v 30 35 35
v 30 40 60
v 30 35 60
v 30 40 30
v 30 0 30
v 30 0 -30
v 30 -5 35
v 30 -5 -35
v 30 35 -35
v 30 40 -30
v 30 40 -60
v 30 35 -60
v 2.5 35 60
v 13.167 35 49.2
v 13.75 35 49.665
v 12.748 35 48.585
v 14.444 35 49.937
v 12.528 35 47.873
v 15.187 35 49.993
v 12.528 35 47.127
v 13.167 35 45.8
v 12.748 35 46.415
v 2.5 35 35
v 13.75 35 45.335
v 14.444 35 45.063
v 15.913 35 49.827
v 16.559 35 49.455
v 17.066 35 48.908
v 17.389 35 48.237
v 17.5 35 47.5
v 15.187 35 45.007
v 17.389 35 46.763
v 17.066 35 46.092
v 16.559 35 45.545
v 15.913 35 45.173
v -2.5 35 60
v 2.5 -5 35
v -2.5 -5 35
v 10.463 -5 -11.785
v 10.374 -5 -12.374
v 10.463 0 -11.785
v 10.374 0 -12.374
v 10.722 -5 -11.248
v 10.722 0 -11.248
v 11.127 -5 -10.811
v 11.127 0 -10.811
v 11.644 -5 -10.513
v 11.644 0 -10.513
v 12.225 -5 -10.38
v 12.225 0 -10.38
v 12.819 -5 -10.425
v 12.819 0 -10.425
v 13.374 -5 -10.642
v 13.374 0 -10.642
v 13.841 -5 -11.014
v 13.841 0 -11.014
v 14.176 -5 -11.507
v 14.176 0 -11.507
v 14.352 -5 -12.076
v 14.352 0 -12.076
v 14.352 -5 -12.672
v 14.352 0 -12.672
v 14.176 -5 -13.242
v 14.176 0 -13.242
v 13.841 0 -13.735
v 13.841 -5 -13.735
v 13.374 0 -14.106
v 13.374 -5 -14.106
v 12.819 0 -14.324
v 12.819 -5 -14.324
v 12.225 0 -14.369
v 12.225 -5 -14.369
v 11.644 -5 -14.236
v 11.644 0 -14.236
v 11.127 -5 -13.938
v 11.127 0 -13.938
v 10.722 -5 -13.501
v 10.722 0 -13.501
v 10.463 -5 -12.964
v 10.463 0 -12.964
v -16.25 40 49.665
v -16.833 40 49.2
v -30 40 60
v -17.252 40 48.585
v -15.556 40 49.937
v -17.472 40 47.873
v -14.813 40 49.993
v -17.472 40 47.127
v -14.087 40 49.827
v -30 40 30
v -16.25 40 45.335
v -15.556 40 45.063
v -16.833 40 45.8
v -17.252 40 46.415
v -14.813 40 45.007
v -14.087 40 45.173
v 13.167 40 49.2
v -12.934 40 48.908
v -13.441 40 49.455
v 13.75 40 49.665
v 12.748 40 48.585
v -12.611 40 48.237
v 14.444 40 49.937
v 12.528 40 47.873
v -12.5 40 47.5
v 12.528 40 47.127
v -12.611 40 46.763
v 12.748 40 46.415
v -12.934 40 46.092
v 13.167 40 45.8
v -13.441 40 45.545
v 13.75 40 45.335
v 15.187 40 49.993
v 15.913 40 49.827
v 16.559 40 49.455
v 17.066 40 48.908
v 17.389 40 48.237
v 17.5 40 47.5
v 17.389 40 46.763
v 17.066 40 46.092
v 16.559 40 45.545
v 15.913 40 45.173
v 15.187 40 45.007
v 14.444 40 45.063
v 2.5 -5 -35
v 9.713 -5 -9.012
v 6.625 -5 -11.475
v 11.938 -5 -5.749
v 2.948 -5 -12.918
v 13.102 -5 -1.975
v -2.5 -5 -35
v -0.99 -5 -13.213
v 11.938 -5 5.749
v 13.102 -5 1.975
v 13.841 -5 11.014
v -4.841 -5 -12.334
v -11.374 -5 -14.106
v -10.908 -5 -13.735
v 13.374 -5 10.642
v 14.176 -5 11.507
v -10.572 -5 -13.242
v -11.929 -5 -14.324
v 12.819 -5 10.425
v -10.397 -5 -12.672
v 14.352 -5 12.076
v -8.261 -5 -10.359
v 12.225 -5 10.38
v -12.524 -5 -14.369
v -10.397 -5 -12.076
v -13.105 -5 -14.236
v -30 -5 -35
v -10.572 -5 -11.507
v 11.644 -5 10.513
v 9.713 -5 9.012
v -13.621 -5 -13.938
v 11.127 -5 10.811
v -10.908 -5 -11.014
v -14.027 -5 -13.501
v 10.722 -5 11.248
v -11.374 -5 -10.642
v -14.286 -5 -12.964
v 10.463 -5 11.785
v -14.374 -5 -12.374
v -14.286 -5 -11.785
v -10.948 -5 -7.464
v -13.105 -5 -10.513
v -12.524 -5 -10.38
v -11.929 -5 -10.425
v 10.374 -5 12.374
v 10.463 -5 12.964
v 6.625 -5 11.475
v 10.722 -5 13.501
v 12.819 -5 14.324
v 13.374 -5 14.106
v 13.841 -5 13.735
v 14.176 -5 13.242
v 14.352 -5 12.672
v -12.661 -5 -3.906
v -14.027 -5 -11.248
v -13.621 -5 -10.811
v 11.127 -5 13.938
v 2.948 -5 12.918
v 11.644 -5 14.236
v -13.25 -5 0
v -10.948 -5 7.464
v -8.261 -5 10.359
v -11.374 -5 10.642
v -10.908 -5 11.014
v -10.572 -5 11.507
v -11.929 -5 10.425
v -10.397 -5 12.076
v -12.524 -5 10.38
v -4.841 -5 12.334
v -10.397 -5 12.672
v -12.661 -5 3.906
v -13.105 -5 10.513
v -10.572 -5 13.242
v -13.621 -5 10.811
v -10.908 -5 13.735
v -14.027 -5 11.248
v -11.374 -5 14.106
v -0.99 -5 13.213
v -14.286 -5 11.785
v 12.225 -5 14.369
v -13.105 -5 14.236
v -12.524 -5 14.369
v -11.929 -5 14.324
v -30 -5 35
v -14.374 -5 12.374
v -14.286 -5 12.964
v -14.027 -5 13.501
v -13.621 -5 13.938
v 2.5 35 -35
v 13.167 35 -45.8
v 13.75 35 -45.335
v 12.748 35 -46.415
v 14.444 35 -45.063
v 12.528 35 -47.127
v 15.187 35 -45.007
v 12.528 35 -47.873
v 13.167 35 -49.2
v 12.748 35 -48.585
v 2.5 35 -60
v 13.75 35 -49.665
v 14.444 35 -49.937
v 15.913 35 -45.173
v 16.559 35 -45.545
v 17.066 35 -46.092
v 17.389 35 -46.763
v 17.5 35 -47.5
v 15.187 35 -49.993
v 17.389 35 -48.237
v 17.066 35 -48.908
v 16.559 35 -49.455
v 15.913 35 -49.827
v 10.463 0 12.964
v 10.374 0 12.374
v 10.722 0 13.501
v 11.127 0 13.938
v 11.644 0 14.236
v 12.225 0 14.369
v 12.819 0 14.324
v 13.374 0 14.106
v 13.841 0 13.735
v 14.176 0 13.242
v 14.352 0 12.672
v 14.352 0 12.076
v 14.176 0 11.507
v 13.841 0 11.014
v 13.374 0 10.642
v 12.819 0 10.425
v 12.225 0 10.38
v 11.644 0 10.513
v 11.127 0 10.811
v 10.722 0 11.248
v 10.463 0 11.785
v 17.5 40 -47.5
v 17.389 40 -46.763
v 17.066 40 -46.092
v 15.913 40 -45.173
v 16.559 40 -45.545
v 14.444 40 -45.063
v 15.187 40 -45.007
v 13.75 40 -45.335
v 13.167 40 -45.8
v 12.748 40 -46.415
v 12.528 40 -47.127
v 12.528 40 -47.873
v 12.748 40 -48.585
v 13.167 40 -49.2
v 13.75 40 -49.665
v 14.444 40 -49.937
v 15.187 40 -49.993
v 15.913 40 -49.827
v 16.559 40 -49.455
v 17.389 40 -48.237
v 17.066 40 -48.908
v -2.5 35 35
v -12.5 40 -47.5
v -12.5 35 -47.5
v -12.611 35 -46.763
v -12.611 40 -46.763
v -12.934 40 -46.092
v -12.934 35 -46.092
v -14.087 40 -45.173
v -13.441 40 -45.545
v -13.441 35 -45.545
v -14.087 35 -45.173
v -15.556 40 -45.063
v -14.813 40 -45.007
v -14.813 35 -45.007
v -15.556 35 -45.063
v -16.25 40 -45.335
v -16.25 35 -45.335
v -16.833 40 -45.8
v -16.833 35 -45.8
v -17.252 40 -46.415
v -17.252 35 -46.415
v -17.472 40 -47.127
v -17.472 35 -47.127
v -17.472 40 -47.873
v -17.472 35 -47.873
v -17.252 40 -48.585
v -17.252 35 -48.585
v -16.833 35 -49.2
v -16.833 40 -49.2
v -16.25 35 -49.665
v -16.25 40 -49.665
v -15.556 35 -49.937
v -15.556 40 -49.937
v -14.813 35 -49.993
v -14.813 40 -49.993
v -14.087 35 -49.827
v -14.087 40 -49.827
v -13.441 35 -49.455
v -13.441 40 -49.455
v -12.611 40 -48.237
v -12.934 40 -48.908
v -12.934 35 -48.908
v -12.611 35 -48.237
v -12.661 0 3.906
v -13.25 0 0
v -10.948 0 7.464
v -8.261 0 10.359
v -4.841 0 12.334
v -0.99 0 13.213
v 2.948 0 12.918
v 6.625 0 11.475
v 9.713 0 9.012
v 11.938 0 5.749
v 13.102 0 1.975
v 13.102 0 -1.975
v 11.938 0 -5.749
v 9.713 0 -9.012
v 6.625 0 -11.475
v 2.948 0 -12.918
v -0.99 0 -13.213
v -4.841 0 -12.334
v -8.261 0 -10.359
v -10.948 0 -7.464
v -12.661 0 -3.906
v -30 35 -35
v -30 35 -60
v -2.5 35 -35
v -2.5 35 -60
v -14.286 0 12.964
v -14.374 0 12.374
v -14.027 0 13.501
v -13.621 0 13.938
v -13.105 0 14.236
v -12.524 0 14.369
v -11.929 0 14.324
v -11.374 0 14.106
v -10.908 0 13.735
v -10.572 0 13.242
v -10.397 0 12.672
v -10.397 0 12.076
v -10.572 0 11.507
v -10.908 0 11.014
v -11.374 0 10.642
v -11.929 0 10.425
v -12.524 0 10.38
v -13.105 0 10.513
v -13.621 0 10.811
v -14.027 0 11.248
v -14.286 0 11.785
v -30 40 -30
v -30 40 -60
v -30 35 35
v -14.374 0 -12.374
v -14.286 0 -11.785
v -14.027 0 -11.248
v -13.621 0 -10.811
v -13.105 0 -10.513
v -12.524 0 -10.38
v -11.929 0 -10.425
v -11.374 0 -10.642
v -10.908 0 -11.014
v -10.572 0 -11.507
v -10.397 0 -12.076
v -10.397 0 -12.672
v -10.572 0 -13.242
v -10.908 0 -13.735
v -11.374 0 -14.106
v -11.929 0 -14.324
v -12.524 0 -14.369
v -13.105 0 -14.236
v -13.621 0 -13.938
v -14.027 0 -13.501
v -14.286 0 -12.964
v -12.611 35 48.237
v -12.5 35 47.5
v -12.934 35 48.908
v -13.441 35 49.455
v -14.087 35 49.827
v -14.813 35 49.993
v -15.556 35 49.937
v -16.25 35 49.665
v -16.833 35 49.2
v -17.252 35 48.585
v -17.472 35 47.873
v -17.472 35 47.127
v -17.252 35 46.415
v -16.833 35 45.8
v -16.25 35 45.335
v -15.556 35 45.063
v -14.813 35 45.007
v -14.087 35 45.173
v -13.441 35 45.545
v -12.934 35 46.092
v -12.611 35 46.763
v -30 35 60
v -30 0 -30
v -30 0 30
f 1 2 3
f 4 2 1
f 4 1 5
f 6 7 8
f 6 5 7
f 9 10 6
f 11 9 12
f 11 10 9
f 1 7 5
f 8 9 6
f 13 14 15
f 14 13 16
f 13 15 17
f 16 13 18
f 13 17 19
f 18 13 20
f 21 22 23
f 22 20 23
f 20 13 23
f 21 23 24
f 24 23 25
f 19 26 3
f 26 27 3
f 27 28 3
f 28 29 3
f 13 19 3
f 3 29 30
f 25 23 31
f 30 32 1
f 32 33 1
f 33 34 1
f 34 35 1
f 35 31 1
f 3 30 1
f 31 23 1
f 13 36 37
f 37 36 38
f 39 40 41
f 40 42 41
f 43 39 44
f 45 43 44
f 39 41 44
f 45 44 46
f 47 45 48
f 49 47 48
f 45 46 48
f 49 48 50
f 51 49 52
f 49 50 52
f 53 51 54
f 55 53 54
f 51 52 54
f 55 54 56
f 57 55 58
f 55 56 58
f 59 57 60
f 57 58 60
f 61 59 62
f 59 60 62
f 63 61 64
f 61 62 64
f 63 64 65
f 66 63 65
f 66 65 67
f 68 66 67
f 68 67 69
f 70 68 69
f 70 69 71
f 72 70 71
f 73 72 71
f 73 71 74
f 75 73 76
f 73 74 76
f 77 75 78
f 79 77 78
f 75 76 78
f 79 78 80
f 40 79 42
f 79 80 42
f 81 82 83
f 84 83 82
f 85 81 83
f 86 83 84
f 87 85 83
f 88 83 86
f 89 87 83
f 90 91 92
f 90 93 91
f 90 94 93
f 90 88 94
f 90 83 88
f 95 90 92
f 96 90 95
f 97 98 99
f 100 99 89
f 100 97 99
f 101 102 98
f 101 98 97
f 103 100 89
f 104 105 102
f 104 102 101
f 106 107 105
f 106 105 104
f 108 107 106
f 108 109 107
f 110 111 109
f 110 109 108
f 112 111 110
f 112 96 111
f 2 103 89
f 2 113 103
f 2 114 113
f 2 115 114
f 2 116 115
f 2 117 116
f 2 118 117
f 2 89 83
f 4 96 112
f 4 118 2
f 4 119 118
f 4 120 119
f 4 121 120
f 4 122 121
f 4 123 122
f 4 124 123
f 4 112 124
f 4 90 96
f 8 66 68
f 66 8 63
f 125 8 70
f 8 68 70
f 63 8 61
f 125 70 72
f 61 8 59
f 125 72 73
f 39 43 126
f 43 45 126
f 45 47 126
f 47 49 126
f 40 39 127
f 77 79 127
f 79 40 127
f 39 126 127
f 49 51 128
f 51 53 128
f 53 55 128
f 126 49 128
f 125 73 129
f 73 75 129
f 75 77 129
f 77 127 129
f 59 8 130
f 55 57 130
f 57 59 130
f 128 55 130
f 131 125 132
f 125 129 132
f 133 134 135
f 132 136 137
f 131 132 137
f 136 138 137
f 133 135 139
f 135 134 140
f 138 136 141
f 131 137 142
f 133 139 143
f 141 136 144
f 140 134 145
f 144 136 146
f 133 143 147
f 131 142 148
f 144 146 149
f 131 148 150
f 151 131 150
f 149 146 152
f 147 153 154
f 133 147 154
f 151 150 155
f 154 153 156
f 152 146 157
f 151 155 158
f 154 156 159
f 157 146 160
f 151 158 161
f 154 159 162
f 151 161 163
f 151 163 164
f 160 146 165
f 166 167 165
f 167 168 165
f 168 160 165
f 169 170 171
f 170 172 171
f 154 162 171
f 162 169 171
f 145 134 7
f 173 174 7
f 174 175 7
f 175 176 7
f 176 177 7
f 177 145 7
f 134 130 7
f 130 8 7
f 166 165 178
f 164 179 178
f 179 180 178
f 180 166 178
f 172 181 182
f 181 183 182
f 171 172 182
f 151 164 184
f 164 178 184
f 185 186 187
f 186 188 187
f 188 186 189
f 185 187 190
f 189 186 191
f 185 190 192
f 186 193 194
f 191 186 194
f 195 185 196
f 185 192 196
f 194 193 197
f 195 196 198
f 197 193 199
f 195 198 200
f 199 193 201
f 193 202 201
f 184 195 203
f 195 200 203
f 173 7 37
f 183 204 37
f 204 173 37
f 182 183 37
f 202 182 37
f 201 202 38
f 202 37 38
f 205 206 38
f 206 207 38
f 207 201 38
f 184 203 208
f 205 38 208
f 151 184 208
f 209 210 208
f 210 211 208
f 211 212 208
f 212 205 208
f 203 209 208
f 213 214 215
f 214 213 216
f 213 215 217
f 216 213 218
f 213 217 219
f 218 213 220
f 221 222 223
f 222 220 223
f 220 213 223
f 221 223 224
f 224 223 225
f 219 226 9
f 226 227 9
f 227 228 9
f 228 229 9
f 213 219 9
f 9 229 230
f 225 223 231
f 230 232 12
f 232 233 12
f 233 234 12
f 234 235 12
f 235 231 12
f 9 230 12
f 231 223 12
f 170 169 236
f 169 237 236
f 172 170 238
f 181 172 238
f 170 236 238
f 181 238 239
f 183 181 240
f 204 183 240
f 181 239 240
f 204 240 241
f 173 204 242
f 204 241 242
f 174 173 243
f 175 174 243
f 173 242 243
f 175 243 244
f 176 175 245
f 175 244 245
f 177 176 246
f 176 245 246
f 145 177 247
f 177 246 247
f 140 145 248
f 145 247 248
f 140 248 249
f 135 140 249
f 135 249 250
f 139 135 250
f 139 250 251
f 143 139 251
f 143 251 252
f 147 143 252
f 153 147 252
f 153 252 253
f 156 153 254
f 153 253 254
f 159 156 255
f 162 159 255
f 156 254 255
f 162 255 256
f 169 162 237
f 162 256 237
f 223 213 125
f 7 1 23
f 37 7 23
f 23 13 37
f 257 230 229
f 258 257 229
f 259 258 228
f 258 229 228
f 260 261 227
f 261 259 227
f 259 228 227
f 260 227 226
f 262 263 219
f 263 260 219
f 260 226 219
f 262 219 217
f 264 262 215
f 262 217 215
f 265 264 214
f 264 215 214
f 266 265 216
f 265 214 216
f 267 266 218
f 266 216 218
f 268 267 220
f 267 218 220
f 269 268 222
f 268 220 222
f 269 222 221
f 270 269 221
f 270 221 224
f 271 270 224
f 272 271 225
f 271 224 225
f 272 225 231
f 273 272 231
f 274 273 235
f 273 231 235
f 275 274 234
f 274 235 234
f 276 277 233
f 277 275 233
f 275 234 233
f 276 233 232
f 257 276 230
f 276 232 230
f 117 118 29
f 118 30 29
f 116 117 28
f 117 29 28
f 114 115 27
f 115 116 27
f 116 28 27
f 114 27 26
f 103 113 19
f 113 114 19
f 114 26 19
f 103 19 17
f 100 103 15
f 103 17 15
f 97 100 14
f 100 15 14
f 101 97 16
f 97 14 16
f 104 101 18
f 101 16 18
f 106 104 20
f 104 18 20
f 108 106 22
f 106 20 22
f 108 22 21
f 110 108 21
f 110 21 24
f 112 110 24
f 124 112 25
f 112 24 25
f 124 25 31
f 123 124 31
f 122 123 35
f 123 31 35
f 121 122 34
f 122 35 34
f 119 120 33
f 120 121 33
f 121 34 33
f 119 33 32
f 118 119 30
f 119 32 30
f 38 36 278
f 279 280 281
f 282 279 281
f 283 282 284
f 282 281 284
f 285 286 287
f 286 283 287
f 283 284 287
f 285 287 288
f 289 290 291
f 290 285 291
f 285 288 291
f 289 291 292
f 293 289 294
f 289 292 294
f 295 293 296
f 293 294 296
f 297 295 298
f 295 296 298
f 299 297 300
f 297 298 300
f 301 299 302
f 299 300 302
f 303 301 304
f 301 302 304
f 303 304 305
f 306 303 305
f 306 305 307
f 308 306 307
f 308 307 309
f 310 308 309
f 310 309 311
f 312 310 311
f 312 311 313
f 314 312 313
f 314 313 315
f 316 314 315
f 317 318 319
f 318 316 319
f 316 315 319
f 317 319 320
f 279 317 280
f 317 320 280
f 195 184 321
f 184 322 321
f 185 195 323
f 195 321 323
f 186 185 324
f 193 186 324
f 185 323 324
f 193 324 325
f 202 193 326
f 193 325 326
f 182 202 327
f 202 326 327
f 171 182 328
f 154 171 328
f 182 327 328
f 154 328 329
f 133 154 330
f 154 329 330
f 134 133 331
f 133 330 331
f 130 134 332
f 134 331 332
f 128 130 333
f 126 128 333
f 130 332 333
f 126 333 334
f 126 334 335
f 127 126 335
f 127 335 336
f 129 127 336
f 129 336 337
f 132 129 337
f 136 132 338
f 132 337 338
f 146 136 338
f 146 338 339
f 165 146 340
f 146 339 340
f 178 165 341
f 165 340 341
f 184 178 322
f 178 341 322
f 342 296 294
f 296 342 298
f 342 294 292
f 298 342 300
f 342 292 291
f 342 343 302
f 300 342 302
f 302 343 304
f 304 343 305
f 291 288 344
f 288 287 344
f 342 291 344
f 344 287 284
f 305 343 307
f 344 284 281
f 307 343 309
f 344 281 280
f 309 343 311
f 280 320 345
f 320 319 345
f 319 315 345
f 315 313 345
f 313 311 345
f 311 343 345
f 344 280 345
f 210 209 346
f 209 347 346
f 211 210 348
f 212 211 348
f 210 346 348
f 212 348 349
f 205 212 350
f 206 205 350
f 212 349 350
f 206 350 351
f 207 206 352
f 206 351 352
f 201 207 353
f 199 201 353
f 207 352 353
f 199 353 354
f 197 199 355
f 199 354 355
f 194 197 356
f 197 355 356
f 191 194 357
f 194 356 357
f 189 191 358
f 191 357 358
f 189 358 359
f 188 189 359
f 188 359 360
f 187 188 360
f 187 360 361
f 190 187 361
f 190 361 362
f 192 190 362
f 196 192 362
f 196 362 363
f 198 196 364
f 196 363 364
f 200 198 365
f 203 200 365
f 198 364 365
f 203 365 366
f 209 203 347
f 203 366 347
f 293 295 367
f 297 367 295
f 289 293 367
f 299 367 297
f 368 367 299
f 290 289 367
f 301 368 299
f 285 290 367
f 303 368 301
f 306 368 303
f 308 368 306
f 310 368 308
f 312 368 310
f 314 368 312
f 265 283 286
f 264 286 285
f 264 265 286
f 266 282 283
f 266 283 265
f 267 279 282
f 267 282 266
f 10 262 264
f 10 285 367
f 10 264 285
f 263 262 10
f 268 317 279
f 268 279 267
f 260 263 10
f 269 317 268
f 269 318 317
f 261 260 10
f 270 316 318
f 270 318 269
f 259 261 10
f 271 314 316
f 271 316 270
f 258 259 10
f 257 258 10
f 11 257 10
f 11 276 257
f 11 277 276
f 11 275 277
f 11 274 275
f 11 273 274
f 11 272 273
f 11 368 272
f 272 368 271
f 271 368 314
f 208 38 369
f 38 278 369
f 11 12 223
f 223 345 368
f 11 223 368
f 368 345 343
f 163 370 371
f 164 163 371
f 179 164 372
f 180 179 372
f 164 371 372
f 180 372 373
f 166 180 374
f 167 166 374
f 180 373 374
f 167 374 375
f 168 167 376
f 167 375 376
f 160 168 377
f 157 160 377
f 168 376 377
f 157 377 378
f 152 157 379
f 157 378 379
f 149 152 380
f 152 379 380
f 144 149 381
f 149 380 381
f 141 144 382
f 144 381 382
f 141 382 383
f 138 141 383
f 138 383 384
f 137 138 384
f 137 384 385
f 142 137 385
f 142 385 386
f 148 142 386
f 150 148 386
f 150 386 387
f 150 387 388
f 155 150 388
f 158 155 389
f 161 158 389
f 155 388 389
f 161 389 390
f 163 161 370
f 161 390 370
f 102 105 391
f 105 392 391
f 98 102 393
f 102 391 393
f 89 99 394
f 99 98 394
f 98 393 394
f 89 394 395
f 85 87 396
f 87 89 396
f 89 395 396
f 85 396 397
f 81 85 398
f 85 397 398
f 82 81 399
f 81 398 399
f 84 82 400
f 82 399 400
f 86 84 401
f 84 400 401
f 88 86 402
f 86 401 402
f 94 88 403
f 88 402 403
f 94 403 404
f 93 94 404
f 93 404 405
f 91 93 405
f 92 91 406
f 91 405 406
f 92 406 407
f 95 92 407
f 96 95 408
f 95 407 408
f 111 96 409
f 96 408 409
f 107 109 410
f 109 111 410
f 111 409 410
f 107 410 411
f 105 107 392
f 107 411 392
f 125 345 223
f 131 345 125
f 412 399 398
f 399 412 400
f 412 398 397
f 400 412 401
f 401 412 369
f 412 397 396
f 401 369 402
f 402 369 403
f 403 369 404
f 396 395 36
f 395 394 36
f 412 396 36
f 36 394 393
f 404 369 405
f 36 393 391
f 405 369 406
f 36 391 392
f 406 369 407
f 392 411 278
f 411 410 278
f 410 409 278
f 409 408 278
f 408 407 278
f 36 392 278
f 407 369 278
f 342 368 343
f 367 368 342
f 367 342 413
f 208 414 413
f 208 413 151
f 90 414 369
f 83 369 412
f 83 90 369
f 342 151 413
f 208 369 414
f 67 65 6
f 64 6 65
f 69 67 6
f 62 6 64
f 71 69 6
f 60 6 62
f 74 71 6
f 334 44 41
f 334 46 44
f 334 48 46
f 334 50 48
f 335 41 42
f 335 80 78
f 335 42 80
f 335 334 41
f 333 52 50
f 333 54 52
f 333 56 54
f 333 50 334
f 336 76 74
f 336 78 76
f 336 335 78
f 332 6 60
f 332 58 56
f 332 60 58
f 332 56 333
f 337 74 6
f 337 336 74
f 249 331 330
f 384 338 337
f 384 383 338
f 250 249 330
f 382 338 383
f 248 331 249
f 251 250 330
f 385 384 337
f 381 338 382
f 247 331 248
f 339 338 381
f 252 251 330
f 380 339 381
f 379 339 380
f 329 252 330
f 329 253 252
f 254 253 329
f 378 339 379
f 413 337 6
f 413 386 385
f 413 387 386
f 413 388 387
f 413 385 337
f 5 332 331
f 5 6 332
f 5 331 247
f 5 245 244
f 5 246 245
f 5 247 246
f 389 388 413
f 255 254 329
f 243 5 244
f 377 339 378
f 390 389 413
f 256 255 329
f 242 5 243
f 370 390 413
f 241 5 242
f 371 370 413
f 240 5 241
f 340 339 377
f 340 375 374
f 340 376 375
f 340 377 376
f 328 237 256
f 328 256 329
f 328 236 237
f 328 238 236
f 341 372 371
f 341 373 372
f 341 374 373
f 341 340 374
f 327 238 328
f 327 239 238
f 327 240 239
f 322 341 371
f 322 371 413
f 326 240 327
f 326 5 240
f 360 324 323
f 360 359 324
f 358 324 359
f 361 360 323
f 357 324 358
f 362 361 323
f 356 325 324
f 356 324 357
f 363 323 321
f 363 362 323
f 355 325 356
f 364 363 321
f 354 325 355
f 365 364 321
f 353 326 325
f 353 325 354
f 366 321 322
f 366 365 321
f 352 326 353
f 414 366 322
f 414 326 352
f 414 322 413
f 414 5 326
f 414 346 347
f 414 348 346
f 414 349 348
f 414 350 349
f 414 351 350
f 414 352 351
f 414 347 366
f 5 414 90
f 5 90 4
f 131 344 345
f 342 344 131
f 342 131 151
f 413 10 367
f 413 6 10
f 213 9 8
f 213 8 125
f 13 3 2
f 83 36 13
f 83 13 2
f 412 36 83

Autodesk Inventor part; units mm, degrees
ref_plane "YZ Plane" through (0, 0, 0) normal (1, 0, 0) x (0, 1, 0)
ref_plane "XZ Plane" through (0, 0, 0) normal (0, 1, 0) x (-1, 0, 0)
sketch "Sketch1" plane through (0, 0, 0) normal (0, 1, 0) x (-1, 0, 0)
  circle A0 centre (0, 0) radius 13.25
  line L0 (0, 0) -> (12.3744, 12.3744) construction
  line L1 (0, 0) -> (17.5, 0) construction
  line L2 (0, 0) -> (-12.3744, -12.3744) construction
  line L3 (0, 0) -> (17.5, 0) construction
  circle A1 centre (-12.3744, -12.3744) radius 2
  circle A2 centre (12.3744, 12.3744) radius 2
  circle A3 centre (12.3744, -12.3744) radius 2
  circle A4 centre (-12.3744, 12.3744) radius 2
  circle A5 centre (0, 0) radius 17.5 construction
  line L4 (30, 30) -> (-30, 30)
  line L5 (-30, 30) -> (-30, -30)
  line L6 (-30, -30) -> (30, -30)
  line L7 (30, -30) -> (30, 30)
  line L8 (30, 30) -> (-30, -30) construction
  line L9 (-30, 30) -> (30, -30) construction
  line L10 (30, -30) -> (-30, -30)
  line L11 (-30, -30) -> (-30, -35)
  line L12 (-30, -35) -> (30, -35)
  line L13 (30, -35) -> (30, -30)
  line L14 (30, 30) -> (-30, 30)
  line L15 (-30, 30) -> (-30, 35)
  line L16 (-30, 35) -> (30, 35)
  line L17 (30, 35) -> (30, 30)
  dimension "d0" = 26.5
  dimension "d1" = 17.5
  dimension "d2" = 45
  dimension "d3" = 17.5
  dimension "d4" = 135
  dimension "d5" = 4
  dimension "d6" = 4
  dimension "d7" = 60
  dimension "d9" = 5
  dimension "d10" = 5
extrude "Extrusion1" add sketch "Sketch1" against normal blind 5
extrude "Extrusion2" add sketch "Sketch1" along normal blind 35 contours L4 L15 L16 L17 | L13 L12 L11 L6
sketch "Sketch4" plane through (-30, 35, 30) normal (0, 1, 0) x (1, 0, 0)
  line L0 (0, 60) -> (0, 0) construction
  line L1 (0, -30) -> (60, -30) construction
  line L2 (30, -17.5) -> (45, -17.5) construction
  line L3 (60, -5) -> (60, -30) construction
  line L4 (30, -17.5) -> (15, -17.5) construction
  circle A0 centre (45, -17.5) radius 2.5
  circle A1 centre (15, -17.5) radius 2.5
  line L5 (60, 0) -> (0, 0) projected
  line L6 (0, 0) -> (0, -30) projected
  line L7 (60, -30) -> (0, -30) projected
  line L8 (60, 0) -> (60, -30) projected
  line L9 (0, 60) -> (60, 60)
  line L10 (60, 60) -> (60, 90)
  line L11 (60, 90) -> (0, 90)
  line L12 (0, 90) -> (0, 60)
  line L13 (60, 0) -> (0, 0) projected
  line L14 (0, 0) -> (60, 0)
  line L15 (60, -5) -> (0, -5) projected
  line L16 (60, -30) -> (0, -30)
  line L17 (0, -30) -> (0, -5)
  line L18 (0, -5) -> (60, -5)
  line L19 (60, -5) -> (60, -30)
  line L20 (60, -30) -> (0, -5) construction
  line L21 (30, -17.5) -> (30, -30) construction
  line L22 (30, 77.5) -> (45, 77.5) construction
  line L23 (30, 77.5) -> (15, 77.5) construction
  circle A2 centre (45, 77.5) radius 2.5
  circle A3 centre (15, 77.5) radius 2.5
  line L24 (60, 65) -> (0, 65)
  line L25 (0, 65) -> (0, 90)
  line L26 (0, 90) -> (60, 90)
  line L27 (60, 90) -> (60, 65)
  line L28 (60, 65) -> (0, 90) construction
  line L29 (30, 77.5) -> (30, 65) construction
  point P0 (30, 30)
  dimension "d19" = 15
  dimension "d20" = 5
  dimension "d28" = 15
  dimension "d29" = 5
extrude "Extrusion4" add sketch "Sketch4" along normal blind 5
ref_plane "Work Plane3" through (0, -5, 35) normal (1, 0, 0) x (0, 0, -1)
sketch "Sketch5" plane through (0, -5, 35) normal (1, 0, 0) x (0, 0, -1)
  line L0 (0, 40) -> (0, 0) projected
  line L1 (0, 0) -> (0, 40)
  line L2 (0, 40) -> (-25, 40)
  line L3 (-25, 45) -> (5, 45) projected
  line L4 (-25, 40) -> (0, 0)
  line L5 (0, 0) -> (70, 0) projected
  line L6 (70, 0) -> (70, 40) projected
  line L7 (70, 0) -> (70, 40)
  line L8 (95, 40) -> (70, 40) projected
  line L9 (70, 40) -> (95, 40)
  line L10 (95, 40) -> (70, 0)
  point P0 (35, 5)
extrude "Extrusion5" add sketch "Sketch5" along normal mid plane 5
properties part number "Base_Motor_Mount"
